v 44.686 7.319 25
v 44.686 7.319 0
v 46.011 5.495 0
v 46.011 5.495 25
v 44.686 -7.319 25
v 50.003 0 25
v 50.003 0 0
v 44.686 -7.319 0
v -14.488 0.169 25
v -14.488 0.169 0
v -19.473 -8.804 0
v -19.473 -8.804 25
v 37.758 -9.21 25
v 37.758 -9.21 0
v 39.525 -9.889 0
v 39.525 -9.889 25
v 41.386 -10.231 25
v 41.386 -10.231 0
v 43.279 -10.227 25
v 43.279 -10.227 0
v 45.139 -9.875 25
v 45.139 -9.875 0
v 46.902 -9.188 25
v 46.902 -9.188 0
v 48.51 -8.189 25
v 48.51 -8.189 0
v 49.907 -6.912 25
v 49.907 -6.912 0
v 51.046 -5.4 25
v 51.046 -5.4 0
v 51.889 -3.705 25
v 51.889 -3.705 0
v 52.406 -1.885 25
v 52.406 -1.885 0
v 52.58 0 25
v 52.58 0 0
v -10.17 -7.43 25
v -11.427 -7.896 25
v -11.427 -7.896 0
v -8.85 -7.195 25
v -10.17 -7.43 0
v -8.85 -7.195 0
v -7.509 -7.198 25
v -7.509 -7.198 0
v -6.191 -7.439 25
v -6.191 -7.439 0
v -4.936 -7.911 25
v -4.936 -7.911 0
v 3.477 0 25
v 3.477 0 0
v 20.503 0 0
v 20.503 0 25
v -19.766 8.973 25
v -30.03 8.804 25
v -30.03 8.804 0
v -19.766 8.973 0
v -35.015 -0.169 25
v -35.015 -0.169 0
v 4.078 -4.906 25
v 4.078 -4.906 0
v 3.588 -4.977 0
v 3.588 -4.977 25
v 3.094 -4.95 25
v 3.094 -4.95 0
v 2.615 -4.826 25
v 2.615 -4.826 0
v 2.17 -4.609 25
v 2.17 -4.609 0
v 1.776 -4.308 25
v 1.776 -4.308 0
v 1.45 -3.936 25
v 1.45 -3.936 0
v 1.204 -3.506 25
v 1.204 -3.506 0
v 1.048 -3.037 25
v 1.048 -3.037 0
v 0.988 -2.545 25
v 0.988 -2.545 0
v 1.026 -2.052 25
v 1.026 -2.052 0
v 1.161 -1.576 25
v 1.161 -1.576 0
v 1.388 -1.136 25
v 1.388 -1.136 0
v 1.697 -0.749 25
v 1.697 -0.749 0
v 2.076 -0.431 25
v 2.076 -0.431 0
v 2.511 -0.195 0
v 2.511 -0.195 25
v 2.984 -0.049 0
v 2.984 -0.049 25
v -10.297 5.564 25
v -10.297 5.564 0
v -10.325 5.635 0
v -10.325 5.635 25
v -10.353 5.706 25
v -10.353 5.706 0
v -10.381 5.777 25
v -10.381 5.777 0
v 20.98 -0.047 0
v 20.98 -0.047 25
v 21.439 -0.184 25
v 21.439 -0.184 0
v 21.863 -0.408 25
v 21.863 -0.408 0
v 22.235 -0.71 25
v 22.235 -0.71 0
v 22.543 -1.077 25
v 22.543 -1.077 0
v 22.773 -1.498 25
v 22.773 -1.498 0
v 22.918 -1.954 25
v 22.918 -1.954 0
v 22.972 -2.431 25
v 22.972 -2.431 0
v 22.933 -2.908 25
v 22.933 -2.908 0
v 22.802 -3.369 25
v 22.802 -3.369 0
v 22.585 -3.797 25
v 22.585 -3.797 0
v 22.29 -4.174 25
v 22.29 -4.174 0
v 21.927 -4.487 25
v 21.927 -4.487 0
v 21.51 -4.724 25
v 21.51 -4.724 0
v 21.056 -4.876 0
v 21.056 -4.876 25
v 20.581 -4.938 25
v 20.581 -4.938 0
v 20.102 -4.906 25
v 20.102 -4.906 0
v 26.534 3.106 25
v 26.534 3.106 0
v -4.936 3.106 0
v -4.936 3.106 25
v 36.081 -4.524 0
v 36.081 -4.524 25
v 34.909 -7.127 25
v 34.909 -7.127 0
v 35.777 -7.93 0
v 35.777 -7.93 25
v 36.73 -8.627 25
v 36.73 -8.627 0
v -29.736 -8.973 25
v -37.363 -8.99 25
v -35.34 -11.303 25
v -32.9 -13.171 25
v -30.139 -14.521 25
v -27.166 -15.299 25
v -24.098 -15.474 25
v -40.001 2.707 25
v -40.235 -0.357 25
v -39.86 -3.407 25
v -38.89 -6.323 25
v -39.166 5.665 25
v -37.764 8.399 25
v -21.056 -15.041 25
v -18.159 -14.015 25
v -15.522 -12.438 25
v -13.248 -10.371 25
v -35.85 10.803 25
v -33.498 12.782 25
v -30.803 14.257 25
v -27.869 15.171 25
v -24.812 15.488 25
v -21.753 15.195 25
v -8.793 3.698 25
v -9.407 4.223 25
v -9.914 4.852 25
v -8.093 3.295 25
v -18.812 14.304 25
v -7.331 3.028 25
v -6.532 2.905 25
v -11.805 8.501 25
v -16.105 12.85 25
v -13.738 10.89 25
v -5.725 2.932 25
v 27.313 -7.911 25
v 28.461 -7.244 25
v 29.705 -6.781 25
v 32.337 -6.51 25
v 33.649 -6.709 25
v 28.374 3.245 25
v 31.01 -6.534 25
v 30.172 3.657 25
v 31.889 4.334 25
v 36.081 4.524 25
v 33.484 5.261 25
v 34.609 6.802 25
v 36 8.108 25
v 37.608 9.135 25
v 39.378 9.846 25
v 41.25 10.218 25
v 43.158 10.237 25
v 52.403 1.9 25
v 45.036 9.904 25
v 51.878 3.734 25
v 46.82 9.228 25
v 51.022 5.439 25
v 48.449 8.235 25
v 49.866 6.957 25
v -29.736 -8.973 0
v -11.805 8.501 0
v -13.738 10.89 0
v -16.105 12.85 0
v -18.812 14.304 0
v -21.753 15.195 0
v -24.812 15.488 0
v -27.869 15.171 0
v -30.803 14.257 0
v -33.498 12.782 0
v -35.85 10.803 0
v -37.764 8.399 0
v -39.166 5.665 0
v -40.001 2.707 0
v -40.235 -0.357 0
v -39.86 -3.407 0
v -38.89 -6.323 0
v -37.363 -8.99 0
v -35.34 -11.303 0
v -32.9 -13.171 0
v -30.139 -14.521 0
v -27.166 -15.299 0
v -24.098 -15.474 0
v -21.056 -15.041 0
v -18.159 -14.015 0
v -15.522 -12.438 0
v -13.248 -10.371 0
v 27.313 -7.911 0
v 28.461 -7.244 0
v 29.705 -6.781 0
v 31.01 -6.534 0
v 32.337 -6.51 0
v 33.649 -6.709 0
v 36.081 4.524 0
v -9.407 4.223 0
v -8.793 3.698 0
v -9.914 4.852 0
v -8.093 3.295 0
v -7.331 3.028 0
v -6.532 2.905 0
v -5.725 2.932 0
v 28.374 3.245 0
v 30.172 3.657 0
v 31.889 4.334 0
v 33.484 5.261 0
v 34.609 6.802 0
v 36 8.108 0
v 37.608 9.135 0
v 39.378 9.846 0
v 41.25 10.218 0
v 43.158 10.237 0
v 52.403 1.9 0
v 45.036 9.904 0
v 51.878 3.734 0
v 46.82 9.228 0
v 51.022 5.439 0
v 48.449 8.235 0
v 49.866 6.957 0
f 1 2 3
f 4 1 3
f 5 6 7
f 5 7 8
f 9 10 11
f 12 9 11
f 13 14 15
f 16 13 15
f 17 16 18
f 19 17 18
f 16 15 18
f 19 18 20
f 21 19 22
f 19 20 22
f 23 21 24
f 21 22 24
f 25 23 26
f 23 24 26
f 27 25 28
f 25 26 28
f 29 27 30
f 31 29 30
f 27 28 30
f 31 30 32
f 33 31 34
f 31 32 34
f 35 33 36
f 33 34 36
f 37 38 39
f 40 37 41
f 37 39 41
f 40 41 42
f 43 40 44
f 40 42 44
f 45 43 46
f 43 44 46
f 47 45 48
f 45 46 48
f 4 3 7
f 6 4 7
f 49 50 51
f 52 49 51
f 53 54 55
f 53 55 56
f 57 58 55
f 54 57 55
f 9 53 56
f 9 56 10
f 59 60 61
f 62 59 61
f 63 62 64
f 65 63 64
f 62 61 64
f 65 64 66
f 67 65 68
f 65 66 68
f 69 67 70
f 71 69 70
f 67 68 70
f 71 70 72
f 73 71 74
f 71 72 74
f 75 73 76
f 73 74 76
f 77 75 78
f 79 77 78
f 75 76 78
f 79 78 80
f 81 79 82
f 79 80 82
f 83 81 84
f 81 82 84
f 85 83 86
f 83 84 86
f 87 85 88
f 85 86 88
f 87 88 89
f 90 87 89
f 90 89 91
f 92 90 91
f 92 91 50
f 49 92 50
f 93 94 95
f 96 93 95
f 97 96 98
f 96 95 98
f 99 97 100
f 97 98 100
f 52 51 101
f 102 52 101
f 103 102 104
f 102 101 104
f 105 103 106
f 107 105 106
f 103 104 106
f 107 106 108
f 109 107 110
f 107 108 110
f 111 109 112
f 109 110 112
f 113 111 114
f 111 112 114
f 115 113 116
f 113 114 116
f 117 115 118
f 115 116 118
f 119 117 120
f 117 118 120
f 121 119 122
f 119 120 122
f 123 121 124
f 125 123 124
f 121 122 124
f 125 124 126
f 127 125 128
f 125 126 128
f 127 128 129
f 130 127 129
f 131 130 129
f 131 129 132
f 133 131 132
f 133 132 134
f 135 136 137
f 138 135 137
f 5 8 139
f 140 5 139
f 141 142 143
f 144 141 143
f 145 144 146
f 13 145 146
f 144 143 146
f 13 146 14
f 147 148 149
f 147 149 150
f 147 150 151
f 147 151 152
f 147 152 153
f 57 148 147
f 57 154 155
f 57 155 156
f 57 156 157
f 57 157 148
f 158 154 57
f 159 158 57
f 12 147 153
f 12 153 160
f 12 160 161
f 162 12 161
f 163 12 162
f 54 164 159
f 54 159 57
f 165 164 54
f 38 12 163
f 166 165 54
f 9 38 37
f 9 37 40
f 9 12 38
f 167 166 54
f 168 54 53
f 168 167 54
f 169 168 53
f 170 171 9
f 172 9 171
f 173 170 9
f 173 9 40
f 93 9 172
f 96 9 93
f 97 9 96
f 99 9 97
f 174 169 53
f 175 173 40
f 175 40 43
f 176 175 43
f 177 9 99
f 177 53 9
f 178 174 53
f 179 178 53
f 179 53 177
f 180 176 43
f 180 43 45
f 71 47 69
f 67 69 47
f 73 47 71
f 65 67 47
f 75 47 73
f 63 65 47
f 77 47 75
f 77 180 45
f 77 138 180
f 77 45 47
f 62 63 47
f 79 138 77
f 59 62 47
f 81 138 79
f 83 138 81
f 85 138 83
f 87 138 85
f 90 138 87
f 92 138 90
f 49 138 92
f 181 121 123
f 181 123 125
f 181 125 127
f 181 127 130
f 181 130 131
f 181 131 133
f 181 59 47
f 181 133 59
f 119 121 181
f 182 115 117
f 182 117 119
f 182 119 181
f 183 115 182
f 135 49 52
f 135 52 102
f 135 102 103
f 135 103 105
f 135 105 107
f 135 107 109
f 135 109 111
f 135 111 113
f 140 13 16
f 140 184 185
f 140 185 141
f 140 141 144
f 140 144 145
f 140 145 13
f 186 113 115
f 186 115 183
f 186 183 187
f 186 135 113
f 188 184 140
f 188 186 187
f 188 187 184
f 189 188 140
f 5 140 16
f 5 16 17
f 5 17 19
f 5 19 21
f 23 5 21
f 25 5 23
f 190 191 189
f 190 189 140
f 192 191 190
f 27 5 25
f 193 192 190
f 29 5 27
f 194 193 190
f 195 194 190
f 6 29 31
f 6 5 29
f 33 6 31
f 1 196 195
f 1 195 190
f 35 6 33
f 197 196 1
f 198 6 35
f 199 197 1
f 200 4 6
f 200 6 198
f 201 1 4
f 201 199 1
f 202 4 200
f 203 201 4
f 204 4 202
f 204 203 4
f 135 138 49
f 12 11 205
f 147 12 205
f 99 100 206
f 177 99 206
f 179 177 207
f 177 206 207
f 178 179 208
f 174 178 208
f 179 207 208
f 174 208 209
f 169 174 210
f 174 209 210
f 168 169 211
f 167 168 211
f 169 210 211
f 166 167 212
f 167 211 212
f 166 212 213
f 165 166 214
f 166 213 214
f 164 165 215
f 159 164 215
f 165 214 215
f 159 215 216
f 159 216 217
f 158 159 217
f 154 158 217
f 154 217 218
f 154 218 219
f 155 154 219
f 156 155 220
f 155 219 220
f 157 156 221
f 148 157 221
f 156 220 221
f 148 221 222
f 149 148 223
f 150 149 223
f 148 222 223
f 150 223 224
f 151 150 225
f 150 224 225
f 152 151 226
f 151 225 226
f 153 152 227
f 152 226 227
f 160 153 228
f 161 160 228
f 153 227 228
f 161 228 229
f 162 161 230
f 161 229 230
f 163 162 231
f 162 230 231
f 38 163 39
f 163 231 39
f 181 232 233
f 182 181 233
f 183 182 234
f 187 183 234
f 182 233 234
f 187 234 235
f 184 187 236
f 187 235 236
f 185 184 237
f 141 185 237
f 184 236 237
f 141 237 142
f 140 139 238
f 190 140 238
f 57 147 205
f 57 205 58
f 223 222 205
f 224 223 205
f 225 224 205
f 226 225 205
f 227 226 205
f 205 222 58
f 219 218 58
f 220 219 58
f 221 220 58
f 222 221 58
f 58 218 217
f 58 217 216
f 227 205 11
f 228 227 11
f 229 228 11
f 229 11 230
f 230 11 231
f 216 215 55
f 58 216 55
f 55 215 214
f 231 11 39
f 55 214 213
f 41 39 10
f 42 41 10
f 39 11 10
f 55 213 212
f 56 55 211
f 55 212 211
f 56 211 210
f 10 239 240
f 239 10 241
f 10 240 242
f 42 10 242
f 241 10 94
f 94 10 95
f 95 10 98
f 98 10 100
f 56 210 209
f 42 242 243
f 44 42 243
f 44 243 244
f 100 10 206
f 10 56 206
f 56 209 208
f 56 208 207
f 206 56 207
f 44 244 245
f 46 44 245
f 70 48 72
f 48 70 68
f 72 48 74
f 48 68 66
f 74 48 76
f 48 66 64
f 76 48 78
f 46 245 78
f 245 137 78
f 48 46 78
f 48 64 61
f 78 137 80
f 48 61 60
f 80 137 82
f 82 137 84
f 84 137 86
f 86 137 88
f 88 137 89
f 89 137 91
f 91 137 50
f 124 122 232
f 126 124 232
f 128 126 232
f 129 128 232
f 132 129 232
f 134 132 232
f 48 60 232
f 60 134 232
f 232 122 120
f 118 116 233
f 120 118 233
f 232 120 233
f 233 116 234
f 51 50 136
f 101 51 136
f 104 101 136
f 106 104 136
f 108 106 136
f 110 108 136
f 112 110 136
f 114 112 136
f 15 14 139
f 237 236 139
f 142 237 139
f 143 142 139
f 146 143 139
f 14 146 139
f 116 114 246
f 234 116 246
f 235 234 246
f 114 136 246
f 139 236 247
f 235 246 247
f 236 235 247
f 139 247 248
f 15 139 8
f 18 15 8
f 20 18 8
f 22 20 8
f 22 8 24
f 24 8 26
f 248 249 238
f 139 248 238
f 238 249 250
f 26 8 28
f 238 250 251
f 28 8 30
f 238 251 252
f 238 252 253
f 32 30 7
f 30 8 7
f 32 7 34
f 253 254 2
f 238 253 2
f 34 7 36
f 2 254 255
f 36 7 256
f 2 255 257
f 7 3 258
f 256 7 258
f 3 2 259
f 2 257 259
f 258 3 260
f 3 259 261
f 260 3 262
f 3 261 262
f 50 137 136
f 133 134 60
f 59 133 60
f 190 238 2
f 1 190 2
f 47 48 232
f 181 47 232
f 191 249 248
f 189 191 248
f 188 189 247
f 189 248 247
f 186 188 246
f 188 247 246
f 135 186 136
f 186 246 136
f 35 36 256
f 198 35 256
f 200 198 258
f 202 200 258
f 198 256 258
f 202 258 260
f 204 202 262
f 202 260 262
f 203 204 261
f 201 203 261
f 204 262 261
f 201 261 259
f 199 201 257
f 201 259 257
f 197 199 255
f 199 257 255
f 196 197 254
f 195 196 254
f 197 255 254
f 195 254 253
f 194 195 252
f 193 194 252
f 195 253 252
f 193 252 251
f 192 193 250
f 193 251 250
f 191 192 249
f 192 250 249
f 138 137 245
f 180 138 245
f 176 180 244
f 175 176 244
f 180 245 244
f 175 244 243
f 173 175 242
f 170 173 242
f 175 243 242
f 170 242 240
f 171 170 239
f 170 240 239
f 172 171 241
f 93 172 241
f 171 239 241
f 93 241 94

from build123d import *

# Parameters (mm, degrees)
F1_DEPTH = 25


with BuildPart() as f1:
    # F0 (on Top) → F1 (new body)
    with BuildSketch(Plane.XY):
        with BuildLine():
            ThreePointArc((37.7576954416, -9.2102163582), (47.7291677906, -8.725438733), (52.5801459464, 0))
            ThreePointArc((52.5801459464, 0), (45.0359965694, 9.9037039133), (33.4842184117, 5.2610793948))
            ThreePointArc((33.4842184117, 5.2610793948), (32.1020667525, -1.1741087466), (34.9094763525, -7.1272962089))
            ThreePointArc((34.9094763525, -7.1272962089), (36.4520652966, -8.0067456142), (37.7576954416, -9.2102163582))
        make_face()
        Polygon((46.0107769178, 5.4953820164), (50.0034056604, 0), (44.6856294577, -7.3192910224), (36.0812868173, -4.5235706254), (36.0812868173, 4.5235706254), (44.6856294577, 7.3192910224), align=None, mode=Mode.SUBTRACT)
        with BuildLine():
            ThreePointArc((34.9094763525, -7.1272962089), (32.1020667525, -1.1741087466), (33.4842184117, 5.2610793948))
            ThreePointArc((33.4842184117, 5.2610793948), (30.1721208062, 3.6571952775), (26.53361631, 3.1060874462))
            Line((26.53361631, 3.1060874462), (-4.9357796088, 3.1060874462))
            ThreePointArc((-4.9357796088, 3.1060874462), (-8.0929029993, 3.2954334717), (-10.29699962, 5.5637452022))
            ThreePointArc((-10.29699962, 5.5637452022), (-9.5238230465, 2.8294901369), (-9.2631732017, 0))
            ThreePointArc((-9.2631732017, 0), (-9.8138730709, -4.0933289992), (-11.4268110085, -7.8955709497))
            ThreePointArc((-11.4268110085, -7.8955709497), (-8.1795839214, -7.1670230809), (-4.9357796088, -7.9106623307))
            Line((-4.9357796088, -7.9106623307), (27.3132491857, -7.9106623307))
            ThreePointArc((27.3132491857, -7.9106623307), (31.0097542861, -6.533691424), (34.9094763525, -7.1272962089))
        make_face()
        with BuildLine():
            ThreePointArc((4.0779244155, -4.9060937017), (1.0056323331, -2.7925497007), (3.4770111088, 0))
            Line((3.4770111088, 0), (20.5028969795, 0))
            ThreePointArc((20.5028969795, 0), (22.9641081907, -2.6703736104), (20.102288574, -4.9060937017))
            Line((20.102288574, -4.9060937017), (4.0779244155, -4.9060937017))
        make_face(mode=Mode.SUBTRACT)
        with BuildLine():
            ThreePointArc((34.9094763525, -7.1272962089), (36.2434833253, -8.2919640144), (37.7576954416, -9.2102163582))
            ThreePointArc((37.7576954416, -9.2102163582), (36.4520652966, -8.0067456142), (34.9094763525, -7.1272962089))
        make_face()
        with BuildLine():
            ThreePointArc((-10.3811004349, 5.7774928533), (-10.3404533777, 5.6700668678), (-10.29699962, 5.5637452022))
            ThreePointArc((-10.29699962, 5.5637452022), (-10.3386537721, 5.6707749377), (-10.3811004349, 5.7774928533))
        make_face()
        with BuildLine():
            ThreePointArc((-9.2631732017, 0), (-9.5238230465, 2.8294901369), (-10.29699962, 5.5637452022))
            ThreePointArc((-10.29699962, 5.5637452022), (-10.3404533777, 5.6700668678), (-10.3811004349, 5.7774928533))
            ThreePointArc((-10.3811004349, 5.7774928533), (-40.1943173282, 1.1810763551), (-11.4268110085, -7.8955709497))
            ThreePointArc((-11.4268110085, -7.8955709497), (-9.8138730709, -4.0933289992), (-9.2631732017, 0))
        make_face()
        Polygon((-19.7663526565, 8.9728942857), (-14.4880691335, 0.1693609529), (-19.4730108813, -8.8035333329), (-29.7362361521, -8.9728942857), (-35.0145196751, -0.1693609529), (-30.0295779273, 8.8035333329), align=None, mode=Mode.SUBTRACT)
    extrude(amount=F1_DEPTH)


solid = f1.part
